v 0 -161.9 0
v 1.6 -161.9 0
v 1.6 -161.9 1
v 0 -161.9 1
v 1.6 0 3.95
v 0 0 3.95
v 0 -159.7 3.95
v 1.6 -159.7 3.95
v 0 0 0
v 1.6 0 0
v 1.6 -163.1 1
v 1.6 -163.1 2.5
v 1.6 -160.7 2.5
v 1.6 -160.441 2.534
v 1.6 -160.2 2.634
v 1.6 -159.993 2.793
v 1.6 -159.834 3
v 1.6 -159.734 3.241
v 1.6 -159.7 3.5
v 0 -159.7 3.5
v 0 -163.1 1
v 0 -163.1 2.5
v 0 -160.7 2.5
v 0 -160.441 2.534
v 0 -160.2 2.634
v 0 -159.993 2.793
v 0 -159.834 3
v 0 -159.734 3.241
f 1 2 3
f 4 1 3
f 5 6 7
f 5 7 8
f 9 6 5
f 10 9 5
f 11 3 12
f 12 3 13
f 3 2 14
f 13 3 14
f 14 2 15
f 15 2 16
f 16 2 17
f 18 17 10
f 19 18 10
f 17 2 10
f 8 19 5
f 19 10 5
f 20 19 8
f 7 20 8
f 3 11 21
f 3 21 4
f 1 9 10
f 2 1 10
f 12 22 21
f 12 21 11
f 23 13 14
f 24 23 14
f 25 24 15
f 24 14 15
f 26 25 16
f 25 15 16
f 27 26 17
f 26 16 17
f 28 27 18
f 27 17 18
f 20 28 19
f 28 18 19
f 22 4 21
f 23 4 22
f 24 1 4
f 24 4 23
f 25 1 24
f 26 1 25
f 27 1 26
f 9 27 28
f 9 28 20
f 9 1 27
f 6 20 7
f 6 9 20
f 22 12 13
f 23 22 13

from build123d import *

# Parameters (mm, degrees)
F0_W     = 1.6
F0_H     = 3.95
F1_DEPTH = 163.1
F2_W     = 1.2
F2_H     = 1
F3_DEPTH = 1.601


with BuildPart() as f1:
    # F0 (on Front) → F1 (new body)
    with BuildSketch(Plane.XZ):
        with Locations((0.8, 1.975)):
            Rectangle(F0_W, F0_H)
    extrude(amount=F1_DEPTH)

    # F2 (on face) → F3 (cut, through all)
    with BuildSketch(Plane.YZ.offset(1.6)):
        with BuildLine():
            Line((-159.7, 3.95), (-163.1, 3.95))
            Line((-163.1, 3.95), (-163.1, 2.5))
            Line((-163.1, 2.5), (-160.7, 2.5))
            ThreePointArc((-160.7, 2.5), (-159.992893, 2.792893), (-159.7, 3.5))
            Line((-159.7, 3.5), (-159.7, 3.95))
        make_face()
        with Locations((-162.5, 0.5)):
            Rectangle(F2_W, F2_H)
    extrude(amount=-F3_DEPTH, mode=Mode.SUBTRACT)


solid = f1.part
